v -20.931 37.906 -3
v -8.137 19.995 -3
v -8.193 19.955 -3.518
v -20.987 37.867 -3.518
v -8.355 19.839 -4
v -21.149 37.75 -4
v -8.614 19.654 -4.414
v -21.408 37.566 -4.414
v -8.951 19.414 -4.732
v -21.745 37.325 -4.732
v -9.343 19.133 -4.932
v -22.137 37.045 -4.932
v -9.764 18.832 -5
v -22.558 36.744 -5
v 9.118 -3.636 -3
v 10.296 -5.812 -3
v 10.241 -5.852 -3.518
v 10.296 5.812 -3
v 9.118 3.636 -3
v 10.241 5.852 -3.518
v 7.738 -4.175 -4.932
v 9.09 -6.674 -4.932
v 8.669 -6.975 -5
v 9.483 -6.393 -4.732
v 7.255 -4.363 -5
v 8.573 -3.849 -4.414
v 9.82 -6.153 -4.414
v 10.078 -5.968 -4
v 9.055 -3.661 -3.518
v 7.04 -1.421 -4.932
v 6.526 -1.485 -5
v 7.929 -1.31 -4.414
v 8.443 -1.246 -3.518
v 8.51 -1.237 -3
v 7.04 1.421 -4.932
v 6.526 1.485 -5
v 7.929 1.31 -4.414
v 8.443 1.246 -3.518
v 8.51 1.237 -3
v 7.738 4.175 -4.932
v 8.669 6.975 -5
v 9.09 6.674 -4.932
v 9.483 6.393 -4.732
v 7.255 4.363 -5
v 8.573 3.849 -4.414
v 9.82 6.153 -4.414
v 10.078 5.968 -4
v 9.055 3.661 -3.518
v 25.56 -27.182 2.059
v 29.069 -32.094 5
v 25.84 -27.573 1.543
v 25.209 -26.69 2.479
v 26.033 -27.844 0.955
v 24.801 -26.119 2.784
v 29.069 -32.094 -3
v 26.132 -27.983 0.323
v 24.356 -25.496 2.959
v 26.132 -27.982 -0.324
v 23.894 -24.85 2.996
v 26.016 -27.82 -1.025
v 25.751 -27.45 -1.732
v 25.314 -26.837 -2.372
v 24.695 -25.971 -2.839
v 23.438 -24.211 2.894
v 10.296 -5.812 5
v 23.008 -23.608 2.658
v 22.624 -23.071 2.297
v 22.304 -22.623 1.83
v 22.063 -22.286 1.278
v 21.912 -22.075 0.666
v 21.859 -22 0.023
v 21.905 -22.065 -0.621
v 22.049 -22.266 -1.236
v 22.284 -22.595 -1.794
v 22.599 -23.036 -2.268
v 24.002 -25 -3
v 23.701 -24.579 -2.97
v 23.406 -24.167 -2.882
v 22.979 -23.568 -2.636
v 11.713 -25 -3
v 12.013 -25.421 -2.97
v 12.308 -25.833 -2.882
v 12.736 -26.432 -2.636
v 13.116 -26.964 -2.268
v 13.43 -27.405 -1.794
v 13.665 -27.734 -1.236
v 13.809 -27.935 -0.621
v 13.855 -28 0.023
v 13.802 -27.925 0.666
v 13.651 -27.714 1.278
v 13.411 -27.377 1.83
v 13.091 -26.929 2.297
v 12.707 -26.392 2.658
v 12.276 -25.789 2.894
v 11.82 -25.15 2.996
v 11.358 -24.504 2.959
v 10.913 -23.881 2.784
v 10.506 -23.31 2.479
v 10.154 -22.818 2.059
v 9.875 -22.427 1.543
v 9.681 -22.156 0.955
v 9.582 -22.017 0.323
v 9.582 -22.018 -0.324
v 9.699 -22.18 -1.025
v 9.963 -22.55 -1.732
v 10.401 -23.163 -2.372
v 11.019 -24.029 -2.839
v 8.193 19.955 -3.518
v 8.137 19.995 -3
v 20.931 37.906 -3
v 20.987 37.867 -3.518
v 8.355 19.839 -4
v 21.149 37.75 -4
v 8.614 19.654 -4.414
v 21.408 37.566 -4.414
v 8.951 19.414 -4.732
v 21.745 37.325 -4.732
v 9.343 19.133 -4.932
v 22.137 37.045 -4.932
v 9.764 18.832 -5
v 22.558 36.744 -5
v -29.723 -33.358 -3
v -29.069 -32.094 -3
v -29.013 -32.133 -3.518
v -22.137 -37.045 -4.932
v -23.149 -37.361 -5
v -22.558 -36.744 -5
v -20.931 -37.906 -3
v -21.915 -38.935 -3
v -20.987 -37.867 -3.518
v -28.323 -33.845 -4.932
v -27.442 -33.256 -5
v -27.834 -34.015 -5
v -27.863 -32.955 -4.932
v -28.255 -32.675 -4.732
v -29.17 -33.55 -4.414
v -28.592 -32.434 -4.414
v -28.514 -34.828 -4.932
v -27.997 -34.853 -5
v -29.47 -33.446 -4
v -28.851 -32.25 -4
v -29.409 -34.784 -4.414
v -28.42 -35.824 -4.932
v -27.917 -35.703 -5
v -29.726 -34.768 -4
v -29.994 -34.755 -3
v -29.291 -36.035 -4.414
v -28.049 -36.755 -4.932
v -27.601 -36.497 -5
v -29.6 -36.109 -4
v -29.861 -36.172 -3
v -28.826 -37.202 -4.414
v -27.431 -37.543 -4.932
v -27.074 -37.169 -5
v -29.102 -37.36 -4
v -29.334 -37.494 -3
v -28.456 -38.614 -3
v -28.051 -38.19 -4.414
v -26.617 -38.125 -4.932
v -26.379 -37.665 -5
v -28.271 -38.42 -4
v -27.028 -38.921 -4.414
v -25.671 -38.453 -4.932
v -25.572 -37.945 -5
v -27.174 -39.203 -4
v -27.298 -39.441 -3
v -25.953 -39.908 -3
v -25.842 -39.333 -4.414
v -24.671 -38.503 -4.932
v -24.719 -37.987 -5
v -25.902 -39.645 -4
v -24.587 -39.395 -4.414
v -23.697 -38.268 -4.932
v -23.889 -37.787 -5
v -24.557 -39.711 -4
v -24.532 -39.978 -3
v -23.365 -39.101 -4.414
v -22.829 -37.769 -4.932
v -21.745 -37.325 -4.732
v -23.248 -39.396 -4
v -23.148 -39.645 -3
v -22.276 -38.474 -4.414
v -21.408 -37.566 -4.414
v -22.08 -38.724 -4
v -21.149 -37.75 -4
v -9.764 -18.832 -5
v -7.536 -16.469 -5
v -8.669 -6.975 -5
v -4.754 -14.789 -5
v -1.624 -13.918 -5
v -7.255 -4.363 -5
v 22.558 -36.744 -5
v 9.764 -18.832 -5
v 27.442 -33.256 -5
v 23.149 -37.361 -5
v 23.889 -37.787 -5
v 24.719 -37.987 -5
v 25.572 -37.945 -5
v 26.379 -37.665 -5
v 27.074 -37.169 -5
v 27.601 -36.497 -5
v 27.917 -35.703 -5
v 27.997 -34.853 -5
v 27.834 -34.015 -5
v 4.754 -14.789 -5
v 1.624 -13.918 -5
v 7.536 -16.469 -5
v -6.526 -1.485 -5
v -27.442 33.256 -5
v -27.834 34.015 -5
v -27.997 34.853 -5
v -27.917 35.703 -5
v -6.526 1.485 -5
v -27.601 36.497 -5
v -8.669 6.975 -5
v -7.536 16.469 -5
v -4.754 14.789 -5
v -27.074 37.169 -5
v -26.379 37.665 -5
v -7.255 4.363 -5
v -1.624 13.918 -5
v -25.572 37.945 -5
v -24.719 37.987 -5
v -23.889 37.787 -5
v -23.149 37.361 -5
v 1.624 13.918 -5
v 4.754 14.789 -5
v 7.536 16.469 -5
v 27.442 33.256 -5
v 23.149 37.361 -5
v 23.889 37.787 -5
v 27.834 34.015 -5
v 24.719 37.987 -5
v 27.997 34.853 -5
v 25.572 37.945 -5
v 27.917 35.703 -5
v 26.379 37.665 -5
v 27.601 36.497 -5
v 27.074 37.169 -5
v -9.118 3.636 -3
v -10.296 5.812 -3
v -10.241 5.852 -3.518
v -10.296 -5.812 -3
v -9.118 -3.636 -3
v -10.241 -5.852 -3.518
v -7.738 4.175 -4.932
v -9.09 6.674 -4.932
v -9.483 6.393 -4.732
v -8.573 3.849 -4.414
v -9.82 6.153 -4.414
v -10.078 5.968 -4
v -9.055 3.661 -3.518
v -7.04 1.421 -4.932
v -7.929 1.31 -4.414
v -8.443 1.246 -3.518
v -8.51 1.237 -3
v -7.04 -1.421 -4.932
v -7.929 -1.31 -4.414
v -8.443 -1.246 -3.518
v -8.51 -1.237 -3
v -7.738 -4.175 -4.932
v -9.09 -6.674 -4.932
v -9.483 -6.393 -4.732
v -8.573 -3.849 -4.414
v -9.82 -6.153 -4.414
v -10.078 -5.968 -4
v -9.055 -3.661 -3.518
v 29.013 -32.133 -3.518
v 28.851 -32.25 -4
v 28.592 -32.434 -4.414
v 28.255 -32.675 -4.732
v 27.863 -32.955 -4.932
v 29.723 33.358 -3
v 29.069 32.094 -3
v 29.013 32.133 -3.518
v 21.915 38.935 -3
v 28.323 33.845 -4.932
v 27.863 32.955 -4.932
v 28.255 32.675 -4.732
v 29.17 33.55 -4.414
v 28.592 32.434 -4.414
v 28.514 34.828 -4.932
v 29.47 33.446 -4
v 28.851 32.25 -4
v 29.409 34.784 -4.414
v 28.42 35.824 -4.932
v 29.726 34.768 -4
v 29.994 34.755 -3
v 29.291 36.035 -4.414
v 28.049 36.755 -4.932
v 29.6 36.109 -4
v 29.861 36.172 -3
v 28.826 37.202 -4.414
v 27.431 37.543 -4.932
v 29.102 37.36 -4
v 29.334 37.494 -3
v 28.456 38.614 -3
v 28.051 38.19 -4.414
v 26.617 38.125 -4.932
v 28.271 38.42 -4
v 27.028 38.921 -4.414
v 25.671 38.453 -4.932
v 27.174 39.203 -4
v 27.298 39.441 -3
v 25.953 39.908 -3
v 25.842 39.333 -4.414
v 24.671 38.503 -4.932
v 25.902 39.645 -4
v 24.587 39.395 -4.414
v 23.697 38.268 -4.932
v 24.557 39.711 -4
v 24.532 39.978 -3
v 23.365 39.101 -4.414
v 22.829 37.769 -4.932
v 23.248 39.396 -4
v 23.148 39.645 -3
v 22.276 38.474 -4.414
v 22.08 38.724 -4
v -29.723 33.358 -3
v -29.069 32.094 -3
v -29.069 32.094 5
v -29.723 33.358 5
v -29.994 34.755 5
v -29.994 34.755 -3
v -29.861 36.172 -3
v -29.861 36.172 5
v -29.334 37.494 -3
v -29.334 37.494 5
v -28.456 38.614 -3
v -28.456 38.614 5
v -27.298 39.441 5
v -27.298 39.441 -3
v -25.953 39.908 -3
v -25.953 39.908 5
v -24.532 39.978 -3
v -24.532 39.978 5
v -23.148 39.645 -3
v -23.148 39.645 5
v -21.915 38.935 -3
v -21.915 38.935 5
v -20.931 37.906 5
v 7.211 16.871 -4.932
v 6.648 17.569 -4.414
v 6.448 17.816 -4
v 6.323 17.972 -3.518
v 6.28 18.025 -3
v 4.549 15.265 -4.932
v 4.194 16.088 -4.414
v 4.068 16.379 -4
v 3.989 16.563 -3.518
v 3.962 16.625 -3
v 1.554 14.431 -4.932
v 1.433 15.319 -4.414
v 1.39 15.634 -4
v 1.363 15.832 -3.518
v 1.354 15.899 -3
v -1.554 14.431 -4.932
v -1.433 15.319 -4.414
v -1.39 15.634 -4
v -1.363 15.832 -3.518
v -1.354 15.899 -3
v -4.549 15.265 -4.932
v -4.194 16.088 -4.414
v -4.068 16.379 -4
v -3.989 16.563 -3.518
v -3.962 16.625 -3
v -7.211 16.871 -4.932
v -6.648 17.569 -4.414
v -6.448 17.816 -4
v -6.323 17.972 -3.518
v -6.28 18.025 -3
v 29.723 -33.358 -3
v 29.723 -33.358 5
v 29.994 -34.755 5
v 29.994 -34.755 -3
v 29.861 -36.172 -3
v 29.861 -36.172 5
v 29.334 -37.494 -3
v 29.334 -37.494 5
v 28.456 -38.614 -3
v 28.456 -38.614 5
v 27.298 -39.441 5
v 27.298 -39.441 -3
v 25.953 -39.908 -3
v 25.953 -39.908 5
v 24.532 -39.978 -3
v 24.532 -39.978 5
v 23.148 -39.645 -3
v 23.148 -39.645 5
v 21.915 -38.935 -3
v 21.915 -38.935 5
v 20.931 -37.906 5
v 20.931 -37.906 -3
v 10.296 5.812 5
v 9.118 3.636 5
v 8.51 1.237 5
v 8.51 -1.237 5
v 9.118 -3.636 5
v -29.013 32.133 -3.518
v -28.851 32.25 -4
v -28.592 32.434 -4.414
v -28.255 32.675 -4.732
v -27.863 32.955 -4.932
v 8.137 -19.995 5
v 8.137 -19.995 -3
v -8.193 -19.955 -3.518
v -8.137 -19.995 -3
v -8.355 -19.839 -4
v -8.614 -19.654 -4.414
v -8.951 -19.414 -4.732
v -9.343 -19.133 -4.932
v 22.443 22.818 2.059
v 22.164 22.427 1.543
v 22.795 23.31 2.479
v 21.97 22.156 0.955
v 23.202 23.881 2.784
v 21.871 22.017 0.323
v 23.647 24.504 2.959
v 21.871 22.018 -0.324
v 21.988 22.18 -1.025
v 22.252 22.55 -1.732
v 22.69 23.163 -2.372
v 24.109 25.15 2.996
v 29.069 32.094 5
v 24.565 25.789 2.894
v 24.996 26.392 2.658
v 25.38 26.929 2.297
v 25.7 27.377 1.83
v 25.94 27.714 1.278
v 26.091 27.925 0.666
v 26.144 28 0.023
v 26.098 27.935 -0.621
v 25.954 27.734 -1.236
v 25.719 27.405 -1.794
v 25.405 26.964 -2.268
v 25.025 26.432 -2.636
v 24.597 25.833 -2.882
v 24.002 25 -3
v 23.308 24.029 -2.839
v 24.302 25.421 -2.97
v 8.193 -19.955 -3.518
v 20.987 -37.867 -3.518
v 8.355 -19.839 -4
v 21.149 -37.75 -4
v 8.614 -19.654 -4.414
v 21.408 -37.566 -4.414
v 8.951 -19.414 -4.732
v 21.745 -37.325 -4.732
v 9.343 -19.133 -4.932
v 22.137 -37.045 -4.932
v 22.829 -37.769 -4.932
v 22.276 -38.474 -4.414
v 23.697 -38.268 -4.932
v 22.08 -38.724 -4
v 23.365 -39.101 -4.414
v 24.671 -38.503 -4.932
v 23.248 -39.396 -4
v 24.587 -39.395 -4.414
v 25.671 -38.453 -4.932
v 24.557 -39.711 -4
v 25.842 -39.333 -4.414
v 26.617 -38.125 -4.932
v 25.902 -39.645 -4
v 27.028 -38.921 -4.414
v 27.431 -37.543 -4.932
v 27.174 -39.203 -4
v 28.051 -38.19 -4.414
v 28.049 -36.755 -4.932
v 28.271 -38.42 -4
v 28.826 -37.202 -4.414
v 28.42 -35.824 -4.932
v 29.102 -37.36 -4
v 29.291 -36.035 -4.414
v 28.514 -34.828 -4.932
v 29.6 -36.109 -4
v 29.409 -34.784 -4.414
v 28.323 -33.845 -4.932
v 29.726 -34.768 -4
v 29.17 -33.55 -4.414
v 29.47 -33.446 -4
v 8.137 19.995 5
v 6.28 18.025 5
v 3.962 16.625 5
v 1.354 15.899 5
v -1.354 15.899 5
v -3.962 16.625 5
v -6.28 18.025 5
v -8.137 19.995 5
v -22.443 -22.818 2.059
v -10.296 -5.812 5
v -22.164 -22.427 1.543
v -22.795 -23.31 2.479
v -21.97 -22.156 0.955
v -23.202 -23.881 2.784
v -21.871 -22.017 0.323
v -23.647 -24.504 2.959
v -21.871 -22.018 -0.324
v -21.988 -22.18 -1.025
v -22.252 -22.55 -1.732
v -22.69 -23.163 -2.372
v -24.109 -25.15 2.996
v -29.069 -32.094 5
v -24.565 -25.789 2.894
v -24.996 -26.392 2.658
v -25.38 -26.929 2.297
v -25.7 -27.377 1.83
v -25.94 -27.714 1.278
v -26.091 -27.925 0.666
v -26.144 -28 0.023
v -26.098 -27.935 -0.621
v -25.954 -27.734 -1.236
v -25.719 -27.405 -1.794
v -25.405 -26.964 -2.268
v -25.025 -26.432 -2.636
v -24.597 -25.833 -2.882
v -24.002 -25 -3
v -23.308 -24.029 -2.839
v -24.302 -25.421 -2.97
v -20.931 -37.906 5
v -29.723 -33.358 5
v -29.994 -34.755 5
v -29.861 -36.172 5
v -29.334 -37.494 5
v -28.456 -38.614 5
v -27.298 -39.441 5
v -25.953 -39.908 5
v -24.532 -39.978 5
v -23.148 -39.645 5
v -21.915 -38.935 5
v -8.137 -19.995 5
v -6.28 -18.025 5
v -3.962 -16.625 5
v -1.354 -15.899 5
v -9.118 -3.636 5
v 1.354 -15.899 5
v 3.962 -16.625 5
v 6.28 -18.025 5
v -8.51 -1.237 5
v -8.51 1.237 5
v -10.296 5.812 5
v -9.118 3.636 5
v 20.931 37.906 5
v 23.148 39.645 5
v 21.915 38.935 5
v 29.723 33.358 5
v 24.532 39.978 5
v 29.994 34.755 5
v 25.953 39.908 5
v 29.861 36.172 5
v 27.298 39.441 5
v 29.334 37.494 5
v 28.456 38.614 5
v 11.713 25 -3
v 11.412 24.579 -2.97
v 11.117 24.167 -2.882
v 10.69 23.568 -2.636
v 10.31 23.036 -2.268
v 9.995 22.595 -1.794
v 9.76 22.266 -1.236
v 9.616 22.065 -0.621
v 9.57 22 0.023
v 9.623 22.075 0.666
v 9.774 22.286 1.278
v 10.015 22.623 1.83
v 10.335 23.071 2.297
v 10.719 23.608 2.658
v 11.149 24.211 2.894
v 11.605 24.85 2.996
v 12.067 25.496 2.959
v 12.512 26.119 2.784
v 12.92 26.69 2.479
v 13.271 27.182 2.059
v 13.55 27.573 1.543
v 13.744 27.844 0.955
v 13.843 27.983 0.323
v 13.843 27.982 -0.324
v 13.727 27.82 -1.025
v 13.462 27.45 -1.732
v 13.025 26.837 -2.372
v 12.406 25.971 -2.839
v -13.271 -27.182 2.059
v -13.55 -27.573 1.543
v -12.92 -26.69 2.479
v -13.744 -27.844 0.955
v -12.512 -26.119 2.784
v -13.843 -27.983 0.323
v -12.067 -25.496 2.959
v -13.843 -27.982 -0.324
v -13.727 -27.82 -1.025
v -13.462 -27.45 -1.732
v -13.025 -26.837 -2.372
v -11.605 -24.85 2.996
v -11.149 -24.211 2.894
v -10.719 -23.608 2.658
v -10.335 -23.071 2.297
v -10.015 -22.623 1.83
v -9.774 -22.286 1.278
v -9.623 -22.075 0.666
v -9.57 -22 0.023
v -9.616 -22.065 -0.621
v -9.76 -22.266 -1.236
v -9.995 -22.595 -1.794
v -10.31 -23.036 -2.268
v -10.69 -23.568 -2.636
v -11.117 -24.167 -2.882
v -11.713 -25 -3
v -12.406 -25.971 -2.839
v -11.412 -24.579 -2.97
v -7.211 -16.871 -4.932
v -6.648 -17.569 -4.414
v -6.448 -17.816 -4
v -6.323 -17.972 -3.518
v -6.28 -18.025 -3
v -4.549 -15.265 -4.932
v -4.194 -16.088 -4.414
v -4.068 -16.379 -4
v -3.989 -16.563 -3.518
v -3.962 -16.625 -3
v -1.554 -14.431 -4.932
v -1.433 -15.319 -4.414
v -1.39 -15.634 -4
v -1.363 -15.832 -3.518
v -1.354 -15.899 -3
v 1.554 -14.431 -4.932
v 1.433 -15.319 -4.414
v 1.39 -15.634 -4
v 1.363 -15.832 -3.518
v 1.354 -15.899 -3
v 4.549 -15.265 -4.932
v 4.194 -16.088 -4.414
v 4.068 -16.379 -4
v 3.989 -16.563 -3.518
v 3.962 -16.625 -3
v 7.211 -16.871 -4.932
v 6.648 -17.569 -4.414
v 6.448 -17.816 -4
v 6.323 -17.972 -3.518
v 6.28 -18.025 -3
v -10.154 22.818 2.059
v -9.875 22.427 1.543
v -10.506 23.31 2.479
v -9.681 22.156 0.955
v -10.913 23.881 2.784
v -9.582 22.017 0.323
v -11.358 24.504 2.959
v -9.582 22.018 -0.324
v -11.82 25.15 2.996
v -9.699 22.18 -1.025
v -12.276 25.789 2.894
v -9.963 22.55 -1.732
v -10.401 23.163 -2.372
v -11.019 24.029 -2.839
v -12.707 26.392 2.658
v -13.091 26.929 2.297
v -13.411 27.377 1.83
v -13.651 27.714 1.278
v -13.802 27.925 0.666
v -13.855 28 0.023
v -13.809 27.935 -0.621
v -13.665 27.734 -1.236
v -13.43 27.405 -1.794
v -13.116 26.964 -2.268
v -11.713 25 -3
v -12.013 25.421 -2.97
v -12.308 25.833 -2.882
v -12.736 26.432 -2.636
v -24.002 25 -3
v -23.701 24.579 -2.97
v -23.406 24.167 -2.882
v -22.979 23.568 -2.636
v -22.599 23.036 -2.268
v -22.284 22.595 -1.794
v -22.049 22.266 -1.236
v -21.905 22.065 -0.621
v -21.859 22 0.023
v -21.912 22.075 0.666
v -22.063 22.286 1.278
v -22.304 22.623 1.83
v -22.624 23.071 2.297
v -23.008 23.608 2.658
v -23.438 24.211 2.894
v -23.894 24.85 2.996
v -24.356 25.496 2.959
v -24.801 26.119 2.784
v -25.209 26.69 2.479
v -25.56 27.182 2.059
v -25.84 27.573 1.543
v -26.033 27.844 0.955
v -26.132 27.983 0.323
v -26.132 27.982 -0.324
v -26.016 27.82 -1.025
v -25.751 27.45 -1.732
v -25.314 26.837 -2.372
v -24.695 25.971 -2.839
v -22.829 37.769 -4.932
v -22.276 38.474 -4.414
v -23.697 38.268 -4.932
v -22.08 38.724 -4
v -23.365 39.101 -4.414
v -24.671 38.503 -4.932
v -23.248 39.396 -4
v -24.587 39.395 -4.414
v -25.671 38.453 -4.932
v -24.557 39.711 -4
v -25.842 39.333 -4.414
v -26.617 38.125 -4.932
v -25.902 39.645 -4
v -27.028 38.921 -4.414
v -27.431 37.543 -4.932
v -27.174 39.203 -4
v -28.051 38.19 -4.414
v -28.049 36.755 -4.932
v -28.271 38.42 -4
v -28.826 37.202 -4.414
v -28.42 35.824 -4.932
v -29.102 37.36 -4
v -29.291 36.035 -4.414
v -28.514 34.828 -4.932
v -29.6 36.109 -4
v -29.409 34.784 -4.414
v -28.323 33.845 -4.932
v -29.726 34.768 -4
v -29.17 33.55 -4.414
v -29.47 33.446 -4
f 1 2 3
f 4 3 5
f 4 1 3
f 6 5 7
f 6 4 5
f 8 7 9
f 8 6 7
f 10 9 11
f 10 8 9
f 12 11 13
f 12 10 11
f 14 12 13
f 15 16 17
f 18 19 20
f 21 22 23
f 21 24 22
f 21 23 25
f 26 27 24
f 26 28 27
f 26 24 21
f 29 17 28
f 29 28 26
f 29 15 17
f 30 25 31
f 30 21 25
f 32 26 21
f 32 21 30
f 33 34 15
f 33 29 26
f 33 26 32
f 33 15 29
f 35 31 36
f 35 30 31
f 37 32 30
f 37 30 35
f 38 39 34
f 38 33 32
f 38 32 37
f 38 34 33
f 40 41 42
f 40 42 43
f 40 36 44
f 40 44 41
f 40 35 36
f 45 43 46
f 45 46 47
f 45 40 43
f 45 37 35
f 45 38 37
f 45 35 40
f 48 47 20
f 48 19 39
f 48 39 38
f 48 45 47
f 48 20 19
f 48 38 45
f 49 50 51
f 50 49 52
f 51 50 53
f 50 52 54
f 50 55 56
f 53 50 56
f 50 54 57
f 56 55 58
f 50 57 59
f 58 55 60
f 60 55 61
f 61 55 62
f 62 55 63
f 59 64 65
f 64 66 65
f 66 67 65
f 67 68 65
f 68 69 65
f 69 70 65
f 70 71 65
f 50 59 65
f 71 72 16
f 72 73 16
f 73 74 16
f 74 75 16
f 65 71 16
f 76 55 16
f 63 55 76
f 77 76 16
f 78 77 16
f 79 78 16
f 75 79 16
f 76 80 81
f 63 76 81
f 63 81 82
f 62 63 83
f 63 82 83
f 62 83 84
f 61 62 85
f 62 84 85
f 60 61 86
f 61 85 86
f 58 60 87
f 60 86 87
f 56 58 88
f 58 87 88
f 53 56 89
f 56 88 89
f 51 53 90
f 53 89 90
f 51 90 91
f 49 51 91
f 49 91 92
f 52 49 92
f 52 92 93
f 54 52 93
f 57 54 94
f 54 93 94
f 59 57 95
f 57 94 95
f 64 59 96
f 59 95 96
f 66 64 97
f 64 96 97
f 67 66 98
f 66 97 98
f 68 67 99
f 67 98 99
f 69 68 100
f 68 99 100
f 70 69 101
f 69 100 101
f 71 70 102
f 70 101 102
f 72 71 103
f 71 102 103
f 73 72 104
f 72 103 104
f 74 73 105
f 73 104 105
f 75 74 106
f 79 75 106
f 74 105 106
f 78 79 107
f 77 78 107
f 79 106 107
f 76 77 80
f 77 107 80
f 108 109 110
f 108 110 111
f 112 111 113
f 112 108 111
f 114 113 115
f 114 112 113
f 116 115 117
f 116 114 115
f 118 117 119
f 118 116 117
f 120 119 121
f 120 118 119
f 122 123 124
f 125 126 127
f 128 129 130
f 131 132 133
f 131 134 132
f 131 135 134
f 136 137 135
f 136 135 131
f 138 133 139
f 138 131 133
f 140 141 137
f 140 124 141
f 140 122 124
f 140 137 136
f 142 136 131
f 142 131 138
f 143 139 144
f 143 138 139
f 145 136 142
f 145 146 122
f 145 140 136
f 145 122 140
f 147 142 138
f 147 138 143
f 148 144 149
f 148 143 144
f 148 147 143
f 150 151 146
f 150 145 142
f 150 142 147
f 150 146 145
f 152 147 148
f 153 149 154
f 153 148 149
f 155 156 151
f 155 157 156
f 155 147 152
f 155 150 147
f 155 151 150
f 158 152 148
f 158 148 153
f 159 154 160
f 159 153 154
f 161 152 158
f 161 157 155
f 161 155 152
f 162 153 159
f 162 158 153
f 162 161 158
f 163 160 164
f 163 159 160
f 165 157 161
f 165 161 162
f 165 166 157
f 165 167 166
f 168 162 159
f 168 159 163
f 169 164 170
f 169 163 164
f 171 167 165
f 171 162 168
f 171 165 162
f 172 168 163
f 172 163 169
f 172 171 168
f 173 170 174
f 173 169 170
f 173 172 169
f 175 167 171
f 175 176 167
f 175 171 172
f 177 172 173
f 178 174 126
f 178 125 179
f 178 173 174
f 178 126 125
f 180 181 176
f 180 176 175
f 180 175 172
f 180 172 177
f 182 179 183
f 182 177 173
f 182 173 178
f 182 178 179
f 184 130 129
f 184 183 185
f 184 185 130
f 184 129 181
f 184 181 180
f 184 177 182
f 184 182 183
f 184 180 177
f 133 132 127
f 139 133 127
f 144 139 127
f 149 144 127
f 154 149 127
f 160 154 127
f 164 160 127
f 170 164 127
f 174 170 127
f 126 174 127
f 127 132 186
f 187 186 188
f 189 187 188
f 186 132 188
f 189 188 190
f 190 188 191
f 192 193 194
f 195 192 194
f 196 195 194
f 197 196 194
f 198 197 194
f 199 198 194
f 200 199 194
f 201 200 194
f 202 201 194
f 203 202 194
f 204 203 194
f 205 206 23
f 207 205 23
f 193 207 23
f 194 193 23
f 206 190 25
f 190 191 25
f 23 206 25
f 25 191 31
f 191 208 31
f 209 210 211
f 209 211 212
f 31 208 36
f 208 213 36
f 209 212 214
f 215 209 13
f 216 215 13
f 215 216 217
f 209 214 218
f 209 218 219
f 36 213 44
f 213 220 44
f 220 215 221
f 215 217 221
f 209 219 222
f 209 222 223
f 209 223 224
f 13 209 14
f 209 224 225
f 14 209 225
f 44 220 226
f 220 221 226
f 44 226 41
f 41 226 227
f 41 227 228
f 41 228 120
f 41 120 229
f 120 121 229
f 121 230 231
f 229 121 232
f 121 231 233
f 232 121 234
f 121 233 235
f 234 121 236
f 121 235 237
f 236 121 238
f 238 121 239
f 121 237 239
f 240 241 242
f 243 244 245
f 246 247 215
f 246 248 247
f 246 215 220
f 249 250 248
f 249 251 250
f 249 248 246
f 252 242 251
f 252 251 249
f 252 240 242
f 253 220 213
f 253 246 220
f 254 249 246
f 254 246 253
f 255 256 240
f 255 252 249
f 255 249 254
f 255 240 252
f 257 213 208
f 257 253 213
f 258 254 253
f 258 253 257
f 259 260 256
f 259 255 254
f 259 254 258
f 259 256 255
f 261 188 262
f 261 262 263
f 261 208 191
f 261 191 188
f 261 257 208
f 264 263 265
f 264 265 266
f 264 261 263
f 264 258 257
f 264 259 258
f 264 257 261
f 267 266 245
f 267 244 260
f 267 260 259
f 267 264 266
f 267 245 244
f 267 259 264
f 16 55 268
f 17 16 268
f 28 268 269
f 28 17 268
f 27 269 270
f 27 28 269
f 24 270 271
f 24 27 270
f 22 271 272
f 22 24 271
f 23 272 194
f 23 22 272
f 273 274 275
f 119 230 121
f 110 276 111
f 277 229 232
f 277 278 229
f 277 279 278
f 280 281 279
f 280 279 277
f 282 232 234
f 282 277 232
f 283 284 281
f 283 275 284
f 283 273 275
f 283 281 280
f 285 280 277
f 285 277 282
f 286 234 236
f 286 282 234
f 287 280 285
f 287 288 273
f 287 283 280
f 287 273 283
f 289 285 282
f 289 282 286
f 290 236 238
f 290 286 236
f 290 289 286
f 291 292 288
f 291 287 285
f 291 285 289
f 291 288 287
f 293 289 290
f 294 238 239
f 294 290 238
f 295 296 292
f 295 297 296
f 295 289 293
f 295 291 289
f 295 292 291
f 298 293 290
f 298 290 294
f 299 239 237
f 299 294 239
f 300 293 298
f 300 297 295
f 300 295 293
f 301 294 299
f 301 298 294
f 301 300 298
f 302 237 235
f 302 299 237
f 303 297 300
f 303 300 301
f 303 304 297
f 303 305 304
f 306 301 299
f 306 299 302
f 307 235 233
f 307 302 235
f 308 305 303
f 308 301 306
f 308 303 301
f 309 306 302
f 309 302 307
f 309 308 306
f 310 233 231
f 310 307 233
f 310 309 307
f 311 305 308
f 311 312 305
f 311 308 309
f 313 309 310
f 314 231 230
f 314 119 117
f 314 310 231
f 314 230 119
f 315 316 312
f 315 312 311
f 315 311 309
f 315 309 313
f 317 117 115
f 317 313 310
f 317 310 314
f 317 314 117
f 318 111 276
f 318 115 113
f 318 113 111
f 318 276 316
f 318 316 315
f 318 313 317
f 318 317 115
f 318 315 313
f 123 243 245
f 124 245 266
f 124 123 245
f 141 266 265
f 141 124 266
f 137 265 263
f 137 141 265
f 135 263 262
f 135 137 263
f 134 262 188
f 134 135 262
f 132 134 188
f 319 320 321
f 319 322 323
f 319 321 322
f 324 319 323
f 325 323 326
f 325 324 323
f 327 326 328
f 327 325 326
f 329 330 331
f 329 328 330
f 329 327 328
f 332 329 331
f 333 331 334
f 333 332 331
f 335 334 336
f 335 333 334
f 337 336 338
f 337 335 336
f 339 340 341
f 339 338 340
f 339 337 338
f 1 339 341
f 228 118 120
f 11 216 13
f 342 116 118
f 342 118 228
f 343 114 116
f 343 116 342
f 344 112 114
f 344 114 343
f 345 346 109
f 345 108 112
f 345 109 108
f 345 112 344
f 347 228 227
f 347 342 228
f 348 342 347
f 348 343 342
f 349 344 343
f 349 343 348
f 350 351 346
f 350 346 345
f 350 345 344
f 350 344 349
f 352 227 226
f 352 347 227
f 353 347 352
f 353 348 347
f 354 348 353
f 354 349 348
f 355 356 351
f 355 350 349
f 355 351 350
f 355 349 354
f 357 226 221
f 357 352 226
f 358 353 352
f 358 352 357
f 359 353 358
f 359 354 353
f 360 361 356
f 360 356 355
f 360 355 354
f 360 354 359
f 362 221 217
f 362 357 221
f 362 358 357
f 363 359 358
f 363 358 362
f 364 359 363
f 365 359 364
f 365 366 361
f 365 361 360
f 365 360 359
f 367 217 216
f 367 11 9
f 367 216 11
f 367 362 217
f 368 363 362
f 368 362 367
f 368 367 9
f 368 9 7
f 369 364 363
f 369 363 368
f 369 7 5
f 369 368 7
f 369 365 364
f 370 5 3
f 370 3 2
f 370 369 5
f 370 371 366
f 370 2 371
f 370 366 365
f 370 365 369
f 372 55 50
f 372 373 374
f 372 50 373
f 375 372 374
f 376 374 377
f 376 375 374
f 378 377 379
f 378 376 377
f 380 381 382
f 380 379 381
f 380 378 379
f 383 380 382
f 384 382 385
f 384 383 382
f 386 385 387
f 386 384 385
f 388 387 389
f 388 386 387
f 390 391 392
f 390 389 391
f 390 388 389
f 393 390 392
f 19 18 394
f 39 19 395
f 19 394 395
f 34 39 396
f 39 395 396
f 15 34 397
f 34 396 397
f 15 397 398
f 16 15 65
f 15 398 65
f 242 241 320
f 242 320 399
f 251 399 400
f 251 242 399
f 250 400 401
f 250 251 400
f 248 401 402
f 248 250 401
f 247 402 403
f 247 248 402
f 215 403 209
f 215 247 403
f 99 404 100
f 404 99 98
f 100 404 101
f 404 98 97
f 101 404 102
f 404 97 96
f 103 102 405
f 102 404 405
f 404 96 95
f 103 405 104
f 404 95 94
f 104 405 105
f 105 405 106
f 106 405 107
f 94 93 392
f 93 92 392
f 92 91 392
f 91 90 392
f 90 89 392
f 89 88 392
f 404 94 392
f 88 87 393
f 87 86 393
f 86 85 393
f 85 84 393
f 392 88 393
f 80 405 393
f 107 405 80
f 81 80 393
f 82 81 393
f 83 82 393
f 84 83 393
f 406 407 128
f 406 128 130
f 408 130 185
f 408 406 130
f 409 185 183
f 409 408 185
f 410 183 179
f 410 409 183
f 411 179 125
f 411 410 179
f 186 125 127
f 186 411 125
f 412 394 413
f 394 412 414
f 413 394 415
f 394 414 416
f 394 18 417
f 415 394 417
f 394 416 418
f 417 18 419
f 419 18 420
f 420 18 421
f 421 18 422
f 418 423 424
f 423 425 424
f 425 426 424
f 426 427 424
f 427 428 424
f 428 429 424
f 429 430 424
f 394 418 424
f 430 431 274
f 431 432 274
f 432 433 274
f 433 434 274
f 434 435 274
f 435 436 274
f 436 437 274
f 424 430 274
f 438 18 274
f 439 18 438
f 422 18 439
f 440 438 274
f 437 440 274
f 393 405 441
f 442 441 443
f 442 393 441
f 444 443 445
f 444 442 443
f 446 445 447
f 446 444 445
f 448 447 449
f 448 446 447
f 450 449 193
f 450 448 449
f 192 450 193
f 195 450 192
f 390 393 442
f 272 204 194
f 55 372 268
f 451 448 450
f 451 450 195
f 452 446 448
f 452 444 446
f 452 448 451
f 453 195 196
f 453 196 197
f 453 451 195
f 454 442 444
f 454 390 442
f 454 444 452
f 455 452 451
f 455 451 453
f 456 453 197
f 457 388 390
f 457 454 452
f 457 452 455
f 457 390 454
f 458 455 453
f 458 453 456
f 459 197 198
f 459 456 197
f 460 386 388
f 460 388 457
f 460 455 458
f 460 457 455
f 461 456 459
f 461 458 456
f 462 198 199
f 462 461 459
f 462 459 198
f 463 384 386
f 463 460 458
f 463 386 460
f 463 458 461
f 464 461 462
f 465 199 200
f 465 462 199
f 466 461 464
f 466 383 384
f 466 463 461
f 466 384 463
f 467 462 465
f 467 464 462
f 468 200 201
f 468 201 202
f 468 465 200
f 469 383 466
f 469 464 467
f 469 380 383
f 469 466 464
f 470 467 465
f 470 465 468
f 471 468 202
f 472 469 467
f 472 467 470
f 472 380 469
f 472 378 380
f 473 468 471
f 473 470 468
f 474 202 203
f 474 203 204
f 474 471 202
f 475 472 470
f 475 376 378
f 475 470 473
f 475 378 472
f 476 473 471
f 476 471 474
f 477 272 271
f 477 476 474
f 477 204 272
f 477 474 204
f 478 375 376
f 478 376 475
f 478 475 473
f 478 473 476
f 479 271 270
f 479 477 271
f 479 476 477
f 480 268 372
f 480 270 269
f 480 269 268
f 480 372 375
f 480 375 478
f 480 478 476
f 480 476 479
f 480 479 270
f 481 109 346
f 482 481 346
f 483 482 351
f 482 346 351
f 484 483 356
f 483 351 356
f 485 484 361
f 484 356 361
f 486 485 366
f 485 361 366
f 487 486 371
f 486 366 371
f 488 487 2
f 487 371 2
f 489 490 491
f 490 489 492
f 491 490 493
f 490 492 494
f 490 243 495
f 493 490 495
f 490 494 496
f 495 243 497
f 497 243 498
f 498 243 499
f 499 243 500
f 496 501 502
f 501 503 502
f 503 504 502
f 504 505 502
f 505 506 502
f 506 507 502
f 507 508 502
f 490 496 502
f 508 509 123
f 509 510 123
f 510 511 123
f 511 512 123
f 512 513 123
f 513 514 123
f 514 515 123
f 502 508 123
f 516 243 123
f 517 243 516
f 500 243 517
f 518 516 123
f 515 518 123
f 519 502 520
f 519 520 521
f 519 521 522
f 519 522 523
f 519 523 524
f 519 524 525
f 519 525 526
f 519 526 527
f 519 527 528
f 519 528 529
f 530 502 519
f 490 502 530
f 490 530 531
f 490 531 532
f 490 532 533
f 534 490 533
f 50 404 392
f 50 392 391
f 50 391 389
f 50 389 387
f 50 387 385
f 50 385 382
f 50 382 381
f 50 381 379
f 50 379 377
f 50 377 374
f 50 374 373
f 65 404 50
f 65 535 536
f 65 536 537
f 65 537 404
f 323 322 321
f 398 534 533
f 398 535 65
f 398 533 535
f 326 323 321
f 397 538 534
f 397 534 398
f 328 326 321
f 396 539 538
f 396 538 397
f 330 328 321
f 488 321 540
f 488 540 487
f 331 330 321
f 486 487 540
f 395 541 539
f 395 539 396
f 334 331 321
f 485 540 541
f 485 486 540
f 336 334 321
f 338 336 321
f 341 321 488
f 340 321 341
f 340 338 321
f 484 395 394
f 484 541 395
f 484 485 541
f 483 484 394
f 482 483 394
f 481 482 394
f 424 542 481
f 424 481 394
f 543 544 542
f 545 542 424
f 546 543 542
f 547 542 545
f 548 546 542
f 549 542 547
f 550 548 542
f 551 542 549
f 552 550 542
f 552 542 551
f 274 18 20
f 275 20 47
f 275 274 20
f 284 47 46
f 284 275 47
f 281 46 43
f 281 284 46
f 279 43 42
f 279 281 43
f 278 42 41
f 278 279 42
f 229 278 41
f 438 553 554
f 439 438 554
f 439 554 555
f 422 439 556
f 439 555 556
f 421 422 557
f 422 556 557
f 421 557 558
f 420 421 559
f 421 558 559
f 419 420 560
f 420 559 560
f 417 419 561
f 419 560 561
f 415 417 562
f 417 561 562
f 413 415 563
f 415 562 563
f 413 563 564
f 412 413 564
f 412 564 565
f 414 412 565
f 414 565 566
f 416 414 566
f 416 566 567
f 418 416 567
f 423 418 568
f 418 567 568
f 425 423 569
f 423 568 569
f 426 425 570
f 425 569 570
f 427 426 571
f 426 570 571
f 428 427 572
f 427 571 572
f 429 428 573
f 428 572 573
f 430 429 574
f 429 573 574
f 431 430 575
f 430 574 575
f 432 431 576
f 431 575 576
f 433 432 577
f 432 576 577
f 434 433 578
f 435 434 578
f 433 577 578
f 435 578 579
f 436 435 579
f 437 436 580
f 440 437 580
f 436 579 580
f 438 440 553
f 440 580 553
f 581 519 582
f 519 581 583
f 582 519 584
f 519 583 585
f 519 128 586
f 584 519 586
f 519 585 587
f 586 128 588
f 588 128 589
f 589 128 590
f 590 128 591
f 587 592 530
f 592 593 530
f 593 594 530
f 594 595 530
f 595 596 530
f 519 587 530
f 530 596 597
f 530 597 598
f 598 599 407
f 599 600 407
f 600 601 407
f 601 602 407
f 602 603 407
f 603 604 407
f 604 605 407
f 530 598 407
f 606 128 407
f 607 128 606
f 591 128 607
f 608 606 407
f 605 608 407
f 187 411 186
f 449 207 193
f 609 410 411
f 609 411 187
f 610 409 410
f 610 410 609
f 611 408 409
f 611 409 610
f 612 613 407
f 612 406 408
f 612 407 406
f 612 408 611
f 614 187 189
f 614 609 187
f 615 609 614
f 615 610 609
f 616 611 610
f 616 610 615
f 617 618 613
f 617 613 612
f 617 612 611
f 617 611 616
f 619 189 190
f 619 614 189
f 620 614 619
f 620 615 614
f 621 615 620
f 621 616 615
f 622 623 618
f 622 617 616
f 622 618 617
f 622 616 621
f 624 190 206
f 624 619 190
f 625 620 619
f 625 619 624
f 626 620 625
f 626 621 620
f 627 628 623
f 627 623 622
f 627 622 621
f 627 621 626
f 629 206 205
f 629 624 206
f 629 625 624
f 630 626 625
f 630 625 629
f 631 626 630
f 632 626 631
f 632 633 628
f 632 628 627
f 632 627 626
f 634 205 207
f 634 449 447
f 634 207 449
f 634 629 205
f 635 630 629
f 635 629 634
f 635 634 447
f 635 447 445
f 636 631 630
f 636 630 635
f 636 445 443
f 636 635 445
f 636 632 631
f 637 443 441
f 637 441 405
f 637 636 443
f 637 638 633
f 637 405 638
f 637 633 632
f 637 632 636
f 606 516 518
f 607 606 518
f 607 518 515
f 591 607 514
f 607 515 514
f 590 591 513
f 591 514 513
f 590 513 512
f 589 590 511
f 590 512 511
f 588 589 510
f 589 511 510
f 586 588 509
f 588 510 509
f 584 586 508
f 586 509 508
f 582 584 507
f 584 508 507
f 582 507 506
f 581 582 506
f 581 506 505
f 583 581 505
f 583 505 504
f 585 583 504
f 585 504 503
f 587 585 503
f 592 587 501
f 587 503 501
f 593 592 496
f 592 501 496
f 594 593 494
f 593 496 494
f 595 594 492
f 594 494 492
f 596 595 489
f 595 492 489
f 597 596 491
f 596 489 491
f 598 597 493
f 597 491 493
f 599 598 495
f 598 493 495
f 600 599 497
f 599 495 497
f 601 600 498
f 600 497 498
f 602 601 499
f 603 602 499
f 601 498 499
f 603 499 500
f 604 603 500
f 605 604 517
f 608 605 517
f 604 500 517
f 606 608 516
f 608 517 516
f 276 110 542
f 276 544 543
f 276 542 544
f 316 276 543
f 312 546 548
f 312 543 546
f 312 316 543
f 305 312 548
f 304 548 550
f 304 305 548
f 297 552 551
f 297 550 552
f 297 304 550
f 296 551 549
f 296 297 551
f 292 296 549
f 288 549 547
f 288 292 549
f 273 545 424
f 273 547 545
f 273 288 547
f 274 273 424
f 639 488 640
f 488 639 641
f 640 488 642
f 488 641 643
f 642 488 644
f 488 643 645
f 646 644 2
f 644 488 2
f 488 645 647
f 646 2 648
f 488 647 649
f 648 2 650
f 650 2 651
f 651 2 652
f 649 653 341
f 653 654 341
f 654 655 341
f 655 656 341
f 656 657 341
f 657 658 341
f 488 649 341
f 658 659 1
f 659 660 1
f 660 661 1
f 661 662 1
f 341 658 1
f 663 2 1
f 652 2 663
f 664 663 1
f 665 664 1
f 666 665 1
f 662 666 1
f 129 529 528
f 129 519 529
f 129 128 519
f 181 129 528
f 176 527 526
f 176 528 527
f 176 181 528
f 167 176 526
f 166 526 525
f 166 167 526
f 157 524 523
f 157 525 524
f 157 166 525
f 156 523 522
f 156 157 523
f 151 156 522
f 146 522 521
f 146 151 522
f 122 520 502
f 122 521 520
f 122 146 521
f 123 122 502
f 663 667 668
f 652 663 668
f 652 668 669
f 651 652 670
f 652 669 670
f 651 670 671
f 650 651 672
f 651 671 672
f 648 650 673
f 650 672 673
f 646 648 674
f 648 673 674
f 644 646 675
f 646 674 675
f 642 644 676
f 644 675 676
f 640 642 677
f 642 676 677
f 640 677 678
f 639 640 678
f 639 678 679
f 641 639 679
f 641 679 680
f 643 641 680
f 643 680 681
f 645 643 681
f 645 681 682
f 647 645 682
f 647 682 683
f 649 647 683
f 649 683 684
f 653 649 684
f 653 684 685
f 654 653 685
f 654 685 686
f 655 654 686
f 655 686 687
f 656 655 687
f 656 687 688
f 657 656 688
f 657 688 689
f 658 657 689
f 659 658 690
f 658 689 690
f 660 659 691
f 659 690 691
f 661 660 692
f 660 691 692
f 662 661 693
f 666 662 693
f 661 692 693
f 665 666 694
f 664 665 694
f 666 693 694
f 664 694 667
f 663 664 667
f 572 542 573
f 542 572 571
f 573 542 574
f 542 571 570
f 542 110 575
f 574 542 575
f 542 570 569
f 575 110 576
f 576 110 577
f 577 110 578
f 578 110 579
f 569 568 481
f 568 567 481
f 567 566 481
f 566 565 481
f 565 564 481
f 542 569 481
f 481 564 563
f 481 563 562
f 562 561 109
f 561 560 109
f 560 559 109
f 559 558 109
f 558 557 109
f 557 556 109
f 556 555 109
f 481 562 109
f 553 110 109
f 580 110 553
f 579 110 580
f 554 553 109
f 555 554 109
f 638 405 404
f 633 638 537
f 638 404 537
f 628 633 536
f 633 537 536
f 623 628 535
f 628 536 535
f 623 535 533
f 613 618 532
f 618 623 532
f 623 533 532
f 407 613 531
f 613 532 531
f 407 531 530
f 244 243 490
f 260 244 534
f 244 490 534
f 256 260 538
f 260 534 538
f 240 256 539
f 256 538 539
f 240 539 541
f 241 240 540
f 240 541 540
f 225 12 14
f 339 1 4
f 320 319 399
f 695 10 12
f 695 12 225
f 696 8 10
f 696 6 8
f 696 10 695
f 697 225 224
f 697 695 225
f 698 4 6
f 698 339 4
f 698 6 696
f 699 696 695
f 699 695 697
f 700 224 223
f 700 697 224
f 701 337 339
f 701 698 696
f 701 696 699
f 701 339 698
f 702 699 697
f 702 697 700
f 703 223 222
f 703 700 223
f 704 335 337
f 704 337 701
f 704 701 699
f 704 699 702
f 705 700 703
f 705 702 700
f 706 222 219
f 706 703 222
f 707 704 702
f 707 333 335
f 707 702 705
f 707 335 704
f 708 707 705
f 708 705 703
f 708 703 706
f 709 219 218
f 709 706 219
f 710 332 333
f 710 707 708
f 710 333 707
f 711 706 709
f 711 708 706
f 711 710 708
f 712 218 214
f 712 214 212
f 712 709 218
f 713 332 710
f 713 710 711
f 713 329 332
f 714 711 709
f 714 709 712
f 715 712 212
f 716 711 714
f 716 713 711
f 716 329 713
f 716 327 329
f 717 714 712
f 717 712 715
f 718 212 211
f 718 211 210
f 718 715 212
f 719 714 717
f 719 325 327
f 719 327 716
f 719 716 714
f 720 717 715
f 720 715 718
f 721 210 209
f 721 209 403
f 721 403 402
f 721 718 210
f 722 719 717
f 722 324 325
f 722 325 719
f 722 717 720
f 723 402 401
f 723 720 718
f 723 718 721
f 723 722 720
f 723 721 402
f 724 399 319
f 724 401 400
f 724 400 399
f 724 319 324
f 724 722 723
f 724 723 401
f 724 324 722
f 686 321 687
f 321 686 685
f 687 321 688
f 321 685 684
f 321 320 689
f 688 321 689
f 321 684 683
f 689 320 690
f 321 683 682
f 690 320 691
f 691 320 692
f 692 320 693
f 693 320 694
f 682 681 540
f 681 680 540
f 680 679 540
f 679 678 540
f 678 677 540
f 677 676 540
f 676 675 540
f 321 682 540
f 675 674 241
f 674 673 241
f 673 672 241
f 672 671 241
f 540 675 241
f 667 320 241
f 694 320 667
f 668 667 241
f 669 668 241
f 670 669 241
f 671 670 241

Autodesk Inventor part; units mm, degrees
ref_plane "XZ Plane" through (0, 0, 0) normal (0, 1, 0) x (-1, 0, 0)
ref_plane "XY Plane" through (0, 0, 0) normal (0, 0, 1) x (1, 0, 0)
sketch "Náčrt1" plane through (0, 0, 0) normal (0, 0, 1) x (1, 0, 0)
  line L0 (25, -35) -> (-25, 35) construction
  line L1 (-25, -35) -> (25, 35) construction
  arc A0 (-20.9313, 37.9062) -> (-29.0687, 32.0938) centre (-25, 35) ccw
  arc A1 (29.0687, 32.0938) -> (20.9313, 37.9062) centre (25, 35) ccw
  arc A2 (-29.0687, -32.0938) -> (-20.9313, -37.9062) centre (-25, -35) ccw
  arc A3 (20.9313, -37.9062) -> (29.0687, -32.0938) centre (25, -35) ccw
  line L2 (20.9313, 37.9062) -> (0, 8.6023)
  line L3 (-6.1445, 0) -> (-29.0687, -32.0938)
  line L4 (29.0687, -32.0938) -> (6.1445, 0)
  line L5 (0, 8.6023) -> (-20.9313, 37.9062)
  line L6 (-20.9313, -37.9062) -> (0, -8.6023)
  line L7 (6.1445, 0) -> (29.0687, 32.0938)
  line L8 (-29.0687, 32.0938) -> (-6.1445, 0)
  line L9 (0, -8.6023) -> (20.9313, -37.9062)
  line L10 (-44.7648, 0) -> (44.7648, 0) projected
  line L11 (0, 58.7648) -> (0, -58.7648) projected
  point P0 (0, 0)
  dimension "d2" = 50
  dimension "d3" = 70
  dimension "d7" = 10
  dimension "d8" = 10
  dimension "d9" = 10
  dimension "d10" = 10
  dimension "d56" = 71.075
  dimension "d57" = 108.925
extrude "Vysunutí1" add sketch "Náčrt1" along normal mid plane 10
fillet "Zaoblení1" radius 10 4 edges at (6.1445, 0, 0) (-6.1445, 0, 0) (0, 8.6023, 0) (0, -8.6023, 0)
ref_plane "Pracovní rovina4" through (0, 0, 0) normal (1, 0, 0) x (0, 1, 0)
sketch "Náčrt4" plane through (0, 0, 0) normal (1, 0, 0) x (0, 1, 0)
  line L0 (-35, 0) -> (35, 0) projected
  line L1 (0, 35) -> (0, -35) projected
  point P0 (0, 0)
  point P1 (25, 0)
  point P2 (-25, 0)
hole "Díra1" at (0, 25, 0) at (0, -25, 0) direction (-1, 0, 0) diameter 6 end through all both
fillet "Zaoblení3" radius 2 12 edges at (-19.6824, 18.9531, -5) (-27.9062, 39.0687, -5) (-14.5343, 28.9504, -5) (14.5343, 28.9504, -5) (27.9062, 39.0687, -5) (19.6824, 18.9531, -5) (19.6824, -18.9531, -5) (27.9062, -39.0687, -5) (14.5343, -28.9504, -5) (-14.5343, -28.9504, -5) (-27.9062, -39.0687, -5) (-19.6824, -18.9531, -5)
ref_plane "Pracovní rovina5" through (-25, -35, -3) normal (-0.8137, 0.5812, 0) x (0, 0, 1)
properties part number "vetrovaniig"
